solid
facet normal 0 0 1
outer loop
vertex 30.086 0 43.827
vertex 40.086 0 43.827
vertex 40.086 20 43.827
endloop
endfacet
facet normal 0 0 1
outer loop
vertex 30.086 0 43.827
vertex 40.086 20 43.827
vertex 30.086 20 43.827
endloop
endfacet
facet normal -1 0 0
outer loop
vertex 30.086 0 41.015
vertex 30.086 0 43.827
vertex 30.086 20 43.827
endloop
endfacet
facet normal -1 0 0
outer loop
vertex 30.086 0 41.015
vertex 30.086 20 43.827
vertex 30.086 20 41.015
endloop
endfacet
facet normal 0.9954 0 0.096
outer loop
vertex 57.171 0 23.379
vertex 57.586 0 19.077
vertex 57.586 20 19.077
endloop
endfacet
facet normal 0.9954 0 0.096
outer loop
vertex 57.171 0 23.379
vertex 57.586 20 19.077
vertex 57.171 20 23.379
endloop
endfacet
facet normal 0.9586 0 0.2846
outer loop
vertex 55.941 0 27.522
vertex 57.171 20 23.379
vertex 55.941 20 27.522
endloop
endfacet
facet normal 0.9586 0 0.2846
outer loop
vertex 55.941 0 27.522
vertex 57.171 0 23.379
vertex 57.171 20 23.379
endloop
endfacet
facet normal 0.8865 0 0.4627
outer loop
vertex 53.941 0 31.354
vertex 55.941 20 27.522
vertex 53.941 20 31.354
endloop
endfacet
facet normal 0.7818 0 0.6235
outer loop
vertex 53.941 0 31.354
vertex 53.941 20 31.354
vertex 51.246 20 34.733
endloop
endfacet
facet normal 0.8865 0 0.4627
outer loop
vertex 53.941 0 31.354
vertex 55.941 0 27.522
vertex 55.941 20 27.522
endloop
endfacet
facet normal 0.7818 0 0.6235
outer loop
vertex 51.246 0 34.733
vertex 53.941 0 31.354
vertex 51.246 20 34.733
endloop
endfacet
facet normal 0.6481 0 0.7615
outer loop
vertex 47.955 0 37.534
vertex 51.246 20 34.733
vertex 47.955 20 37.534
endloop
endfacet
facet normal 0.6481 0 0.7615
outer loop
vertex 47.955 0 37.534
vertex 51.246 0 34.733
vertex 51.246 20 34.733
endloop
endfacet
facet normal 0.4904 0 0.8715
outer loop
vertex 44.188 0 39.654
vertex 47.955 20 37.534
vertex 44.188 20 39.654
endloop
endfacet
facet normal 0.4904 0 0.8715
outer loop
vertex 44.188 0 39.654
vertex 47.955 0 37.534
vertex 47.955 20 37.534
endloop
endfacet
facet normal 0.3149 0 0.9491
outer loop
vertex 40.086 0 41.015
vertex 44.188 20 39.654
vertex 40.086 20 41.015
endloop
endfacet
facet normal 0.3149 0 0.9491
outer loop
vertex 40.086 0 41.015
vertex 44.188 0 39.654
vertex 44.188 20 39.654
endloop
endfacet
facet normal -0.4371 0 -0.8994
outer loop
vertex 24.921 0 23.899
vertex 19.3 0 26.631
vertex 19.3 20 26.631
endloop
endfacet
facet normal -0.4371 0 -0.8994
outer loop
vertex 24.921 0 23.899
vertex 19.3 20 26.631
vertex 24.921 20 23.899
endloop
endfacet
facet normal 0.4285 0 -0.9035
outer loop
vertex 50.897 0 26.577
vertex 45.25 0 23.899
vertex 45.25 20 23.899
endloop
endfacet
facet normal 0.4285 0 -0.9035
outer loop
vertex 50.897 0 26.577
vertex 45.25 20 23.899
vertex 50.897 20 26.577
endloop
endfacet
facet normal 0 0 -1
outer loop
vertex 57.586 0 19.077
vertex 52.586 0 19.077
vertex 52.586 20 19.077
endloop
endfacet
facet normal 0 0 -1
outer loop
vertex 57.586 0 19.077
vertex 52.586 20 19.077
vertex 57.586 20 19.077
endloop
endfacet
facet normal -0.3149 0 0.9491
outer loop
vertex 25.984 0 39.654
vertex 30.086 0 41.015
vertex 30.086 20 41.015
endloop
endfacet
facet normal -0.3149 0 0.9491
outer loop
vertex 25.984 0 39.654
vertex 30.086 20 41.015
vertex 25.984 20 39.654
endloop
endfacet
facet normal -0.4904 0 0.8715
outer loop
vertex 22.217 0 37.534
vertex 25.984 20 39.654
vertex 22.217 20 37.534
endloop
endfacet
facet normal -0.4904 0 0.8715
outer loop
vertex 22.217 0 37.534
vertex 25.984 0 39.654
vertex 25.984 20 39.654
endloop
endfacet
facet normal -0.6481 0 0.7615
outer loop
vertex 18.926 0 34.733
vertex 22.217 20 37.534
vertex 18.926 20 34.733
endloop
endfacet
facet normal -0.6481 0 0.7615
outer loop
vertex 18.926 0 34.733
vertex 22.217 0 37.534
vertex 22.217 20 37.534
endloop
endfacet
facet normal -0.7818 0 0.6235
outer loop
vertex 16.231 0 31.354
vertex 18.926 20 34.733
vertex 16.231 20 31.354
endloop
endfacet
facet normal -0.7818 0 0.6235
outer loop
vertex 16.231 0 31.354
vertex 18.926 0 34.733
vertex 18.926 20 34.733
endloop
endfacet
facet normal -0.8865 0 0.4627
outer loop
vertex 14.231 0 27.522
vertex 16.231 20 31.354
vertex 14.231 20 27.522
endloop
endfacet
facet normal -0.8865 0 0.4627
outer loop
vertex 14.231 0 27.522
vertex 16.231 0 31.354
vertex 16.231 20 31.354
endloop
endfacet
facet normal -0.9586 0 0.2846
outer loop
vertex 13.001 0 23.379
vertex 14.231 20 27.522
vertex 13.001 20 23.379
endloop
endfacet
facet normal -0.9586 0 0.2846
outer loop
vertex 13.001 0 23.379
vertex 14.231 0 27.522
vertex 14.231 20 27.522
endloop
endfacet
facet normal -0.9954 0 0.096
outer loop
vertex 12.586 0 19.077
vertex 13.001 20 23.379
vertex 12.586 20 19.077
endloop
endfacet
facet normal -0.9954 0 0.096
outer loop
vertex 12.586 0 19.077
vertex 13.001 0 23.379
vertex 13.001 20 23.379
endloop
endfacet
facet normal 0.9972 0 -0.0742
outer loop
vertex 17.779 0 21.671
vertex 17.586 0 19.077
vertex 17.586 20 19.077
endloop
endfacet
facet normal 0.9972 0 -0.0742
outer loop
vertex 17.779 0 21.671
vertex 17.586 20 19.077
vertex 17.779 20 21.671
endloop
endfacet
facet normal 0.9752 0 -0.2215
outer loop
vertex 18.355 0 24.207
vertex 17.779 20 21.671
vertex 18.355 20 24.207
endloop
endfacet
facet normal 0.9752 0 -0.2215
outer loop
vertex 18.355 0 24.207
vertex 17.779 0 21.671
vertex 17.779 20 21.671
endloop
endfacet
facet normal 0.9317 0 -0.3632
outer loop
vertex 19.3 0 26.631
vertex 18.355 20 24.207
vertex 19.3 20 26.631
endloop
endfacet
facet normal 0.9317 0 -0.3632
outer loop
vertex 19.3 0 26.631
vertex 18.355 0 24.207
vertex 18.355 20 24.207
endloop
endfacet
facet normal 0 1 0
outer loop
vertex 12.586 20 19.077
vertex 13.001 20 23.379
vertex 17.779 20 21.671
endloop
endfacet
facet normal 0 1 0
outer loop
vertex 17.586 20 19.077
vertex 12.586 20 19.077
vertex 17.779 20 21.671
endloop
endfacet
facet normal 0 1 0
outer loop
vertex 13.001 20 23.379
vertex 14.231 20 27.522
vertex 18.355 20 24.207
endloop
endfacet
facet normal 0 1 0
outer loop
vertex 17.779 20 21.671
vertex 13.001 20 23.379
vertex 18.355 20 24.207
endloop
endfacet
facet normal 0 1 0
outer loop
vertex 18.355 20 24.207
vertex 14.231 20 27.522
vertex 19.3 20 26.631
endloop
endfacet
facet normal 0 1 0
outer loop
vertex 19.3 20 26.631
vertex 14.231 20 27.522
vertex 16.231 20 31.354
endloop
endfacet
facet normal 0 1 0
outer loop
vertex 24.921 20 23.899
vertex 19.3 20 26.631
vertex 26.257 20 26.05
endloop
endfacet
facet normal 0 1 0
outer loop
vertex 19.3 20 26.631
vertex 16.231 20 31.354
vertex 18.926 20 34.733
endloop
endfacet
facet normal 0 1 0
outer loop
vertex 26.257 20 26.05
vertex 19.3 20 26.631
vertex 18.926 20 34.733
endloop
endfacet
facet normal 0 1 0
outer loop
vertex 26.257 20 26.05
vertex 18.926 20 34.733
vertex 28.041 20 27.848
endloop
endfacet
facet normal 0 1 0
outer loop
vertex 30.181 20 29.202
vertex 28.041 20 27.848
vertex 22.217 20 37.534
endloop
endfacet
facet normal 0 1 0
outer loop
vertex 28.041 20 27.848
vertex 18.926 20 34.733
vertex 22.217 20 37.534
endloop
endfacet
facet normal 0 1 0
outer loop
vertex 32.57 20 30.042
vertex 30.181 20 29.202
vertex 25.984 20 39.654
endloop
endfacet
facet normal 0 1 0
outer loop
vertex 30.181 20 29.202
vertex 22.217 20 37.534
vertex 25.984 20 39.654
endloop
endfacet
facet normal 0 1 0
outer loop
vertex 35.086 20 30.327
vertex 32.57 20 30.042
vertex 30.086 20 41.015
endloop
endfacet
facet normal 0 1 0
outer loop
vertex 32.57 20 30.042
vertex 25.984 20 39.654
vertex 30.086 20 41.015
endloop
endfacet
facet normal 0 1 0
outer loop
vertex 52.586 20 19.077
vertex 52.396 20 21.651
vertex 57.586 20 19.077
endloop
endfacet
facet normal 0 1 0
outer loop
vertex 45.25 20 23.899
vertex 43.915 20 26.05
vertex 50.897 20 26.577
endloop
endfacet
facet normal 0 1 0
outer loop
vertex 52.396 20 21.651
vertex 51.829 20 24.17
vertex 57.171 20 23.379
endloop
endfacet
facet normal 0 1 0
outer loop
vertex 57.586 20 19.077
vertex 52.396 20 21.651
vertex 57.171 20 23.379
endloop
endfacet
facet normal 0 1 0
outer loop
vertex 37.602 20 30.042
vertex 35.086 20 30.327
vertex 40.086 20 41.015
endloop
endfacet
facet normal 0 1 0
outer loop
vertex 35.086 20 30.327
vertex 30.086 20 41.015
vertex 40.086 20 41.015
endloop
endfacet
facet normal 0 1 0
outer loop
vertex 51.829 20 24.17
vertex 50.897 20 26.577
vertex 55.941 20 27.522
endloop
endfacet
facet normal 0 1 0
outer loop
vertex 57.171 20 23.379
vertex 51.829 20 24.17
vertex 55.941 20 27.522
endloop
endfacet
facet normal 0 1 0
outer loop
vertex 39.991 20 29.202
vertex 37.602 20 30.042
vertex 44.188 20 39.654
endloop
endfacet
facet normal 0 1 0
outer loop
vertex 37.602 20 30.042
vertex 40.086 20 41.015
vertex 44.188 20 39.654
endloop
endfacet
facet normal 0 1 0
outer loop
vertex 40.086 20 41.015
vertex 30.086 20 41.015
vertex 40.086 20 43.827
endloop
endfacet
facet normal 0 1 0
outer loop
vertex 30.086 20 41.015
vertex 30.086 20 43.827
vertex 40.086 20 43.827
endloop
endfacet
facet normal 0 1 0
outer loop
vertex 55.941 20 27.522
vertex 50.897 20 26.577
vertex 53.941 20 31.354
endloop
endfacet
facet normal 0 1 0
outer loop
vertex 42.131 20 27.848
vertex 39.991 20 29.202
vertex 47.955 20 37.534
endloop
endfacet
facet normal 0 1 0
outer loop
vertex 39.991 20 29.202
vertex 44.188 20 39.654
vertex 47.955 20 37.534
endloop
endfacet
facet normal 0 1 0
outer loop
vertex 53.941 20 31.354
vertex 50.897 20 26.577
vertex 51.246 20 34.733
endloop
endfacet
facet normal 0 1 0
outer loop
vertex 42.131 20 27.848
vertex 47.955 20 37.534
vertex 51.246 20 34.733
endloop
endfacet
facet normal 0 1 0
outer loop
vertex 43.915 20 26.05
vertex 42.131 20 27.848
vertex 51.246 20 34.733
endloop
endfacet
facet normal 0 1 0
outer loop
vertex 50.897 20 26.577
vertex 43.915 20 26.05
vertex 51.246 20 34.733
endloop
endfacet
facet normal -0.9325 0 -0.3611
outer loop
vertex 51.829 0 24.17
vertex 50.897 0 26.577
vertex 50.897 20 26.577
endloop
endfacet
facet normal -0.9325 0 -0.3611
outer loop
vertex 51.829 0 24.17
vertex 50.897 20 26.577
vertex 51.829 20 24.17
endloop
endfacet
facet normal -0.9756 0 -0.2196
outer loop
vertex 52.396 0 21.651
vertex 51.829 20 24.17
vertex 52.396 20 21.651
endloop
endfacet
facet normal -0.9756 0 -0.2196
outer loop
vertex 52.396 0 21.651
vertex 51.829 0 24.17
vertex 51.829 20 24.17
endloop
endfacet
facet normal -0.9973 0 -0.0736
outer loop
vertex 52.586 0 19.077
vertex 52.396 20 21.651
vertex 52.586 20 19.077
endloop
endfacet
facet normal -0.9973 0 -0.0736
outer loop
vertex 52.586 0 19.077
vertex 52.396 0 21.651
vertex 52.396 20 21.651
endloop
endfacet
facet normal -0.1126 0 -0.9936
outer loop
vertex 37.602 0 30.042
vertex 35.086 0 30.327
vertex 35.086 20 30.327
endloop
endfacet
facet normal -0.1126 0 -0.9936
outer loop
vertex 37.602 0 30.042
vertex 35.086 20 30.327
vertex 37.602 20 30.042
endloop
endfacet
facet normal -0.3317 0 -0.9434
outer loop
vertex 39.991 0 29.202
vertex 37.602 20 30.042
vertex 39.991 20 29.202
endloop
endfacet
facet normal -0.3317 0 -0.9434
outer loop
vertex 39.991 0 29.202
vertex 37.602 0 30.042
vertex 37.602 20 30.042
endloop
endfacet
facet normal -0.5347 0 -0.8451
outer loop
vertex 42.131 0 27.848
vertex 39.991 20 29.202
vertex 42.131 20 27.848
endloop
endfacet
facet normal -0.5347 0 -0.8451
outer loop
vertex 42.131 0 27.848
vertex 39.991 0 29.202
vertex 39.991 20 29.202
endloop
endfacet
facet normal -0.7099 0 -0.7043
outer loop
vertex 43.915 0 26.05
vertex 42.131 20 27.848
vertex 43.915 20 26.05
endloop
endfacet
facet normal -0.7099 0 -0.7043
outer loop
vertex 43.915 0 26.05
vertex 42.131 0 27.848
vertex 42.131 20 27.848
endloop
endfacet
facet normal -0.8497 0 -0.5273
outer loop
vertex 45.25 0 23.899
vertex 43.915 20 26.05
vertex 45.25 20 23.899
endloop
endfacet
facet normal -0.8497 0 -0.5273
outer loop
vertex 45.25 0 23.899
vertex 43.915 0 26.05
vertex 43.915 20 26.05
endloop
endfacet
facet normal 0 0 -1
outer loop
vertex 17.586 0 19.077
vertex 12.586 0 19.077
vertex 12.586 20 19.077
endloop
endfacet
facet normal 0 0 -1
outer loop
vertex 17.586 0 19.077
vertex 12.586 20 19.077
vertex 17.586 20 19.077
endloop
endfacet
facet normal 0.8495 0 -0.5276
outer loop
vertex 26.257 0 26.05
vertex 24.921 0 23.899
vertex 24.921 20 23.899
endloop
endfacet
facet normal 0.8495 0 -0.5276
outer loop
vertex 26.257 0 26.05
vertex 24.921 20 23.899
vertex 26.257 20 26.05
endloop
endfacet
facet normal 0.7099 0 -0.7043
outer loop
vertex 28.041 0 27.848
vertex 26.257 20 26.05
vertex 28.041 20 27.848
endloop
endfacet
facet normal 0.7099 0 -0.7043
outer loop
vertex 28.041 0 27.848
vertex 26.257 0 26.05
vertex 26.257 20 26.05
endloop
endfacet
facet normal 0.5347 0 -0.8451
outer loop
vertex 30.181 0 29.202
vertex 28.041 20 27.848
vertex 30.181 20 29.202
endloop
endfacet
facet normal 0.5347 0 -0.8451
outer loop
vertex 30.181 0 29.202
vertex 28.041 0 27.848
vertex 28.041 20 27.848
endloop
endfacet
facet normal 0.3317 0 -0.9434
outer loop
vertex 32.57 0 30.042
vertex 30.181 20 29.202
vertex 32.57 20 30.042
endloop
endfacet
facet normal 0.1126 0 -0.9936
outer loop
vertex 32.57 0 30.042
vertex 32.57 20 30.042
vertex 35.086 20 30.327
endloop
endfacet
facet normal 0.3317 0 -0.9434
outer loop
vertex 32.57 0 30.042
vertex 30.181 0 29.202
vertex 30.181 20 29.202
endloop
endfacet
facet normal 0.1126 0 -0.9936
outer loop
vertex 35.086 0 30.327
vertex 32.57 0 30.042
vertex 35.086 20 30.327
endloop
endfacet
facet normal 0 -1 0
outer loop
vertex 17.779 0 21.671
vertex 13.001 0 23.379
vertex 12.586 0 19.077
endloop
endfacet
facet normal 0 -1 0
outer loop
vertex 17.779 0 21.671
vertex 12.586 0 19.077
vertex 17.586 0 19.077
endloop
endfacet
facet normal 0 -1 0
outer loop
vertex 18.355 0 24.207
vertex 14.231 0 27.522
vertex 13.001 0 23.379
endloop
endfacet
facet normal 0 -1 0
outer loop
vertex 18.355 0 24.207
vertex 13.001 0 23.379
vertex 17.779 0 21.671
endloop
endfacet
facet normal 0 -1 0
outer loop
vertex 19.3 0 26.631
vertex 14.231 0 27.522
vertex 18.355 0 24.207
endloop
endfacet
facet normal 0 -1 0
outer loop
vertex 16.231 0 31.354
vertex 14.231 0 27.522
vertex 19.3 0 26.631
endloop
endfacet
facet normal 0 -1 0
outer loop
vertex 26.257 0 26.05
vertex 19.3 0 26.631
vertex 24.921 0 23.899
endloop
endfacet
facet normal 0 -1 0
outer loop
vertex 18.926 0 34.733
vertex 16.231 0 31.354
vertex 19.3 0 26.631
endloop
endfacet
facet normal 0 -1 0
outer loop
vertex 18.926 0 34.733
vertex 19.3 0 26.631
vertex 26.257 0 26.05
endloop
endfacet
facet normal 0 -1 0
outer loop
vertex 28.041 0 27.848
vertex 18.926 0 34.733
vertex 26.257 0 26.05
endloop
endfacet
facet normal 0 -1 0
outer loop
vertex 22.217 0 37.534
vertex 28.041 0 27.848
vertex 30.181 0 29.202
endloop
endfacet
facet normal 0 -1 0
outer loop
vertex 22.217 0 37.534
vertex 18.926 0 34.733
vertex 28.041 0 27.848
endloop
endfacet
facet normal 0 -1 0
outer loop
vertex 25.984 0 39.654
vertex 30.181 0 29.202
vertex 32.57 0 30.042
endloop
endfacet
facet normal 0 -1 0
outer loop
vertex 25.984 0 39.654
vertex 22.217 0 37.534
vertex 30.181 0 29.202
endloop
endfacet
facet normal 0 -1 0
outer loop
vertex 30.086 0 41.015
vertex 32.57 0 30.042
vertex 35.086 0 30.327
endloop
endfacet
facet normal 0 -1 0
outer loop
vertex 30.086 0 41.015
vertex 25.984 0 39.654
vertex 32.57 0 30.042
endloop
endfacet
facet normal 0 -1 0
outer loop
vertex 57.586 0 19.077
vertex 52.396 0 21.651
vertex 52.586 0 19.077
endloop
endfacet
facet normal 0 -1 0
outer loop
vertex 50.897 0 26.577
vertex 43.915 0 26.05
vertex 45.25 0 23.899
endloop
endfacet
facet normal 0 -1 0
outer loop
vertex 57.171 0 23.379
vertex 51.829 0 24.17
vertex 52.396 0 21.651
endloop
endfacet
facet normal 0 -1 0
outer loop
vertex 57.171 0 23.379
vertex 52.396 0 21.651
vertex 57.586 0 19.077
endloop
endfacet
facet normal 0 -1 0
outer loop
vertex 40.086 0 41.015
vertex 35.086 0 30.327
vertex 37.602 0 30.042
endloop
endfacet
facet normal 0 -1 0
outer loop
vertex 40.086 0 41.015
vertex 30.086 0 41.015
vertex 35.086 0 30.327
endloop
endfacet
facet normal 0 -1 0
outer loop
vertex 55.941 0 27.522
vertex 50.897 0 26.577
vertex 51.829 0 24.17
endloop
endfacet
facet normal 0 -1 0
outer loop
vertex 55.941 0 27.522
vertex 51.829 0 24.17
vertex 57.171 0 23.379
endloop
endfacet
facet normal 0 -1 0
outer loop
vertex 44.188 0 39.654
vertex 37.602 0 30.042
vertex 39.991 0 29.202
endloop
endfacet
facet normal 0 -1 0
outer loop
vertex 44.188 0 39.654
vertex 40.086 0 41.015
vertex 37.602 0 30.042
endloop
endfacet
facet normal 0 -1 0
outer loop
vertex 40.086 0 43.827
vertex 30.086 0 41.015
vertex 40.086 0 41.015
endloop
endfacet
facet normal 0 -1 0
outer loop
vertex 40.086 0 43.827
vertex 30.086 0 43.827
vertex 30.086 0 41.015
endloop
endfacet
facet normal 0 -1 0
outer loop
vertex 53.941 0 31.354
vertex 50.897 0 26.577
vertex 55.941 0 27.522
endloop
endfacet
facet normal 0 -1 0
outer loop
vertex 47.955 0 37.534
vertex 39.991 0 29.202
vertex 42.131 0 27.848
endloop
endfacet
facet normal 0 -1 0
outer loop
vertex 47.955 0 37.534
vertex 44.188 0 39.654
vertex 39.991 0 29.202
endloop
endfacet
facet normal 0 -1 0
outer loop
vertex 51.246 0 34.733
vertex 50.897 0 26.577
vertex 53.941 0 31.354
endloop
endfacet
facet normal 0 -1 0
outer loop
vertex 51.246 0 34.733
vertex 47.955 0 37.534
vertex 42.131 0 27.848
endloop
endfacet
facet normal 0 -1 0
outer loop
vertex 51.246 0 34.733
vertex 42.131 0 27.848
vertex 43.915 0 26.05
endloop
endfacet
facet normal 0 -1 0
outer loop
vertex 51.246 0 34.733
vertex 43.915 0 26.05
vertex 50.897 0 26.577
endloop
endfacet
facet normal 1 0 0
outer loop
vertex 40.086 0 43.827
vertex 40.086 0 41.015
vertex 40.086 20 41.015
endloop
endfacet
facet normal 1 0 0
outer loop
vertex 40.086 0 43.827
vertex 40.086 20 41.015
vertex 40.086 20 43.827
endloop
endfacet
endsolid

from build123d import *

# Parameters (mm, degrees)
F1_DEPTH = 20


with BuildPart() as f1:
    # F0 (on Front) → F1 (new body)
    with BuildSketch(Plane.XZ):
        with BuildLine():
            ThreePointArc((17.5859551343, 19.07713693), (18.019843983, 22.9498427249), (19.2999951541, 26.6305115074))
            ThreePointArc((19.2999951541, 26.6305115074), (20.3740299114, 28.5539114993), (21.6811985158, 30.32713693))
            ThreePointArc((21.6811985158, 30.32713693), (25.4785218795, 33.7040718876), (30.0859551343, 35.8476467612))
            Line((30.0859551343, 35.8476467612), (30.0859551343, 41.0145478985))
            ThreePointArc((30.0859551343, 41.0145478985), (17.4968960349, 33.1083521304), (12.5859551343, 19.07713693))
            Line((12.5859551343, 19.07713693), (17.5859551343, 19.07713693))
        make_face()
        with BuildLine():
            Line((30.0859551343, 43.82713693), (30.0859551343, 41.0145478985))
            ThreePointArc((30.0859551343, 41.0145478985), (35.0859551343, 41.57713693), (40.0859551343, 41.0145478985))
            Line((40.0859551343, 41.0145478985), (40.0859551343, 43.82713693))
            Line((40.0859551343, 43.82713693), (30.0859551343, 43.82713693))
        make_face()
        with BuildLine():
            Line((30.0859551343, 41.0145478985), (30.0859551343, 35.8476467612))
            ThreePointArc((30.0859551343, 35.8476467612), (35.0859551343, 36.57713693), (40.0859551343, 35.8476467612))
            Line((40.0859551343, 35.8476467612), (40.0859551343, 41.0145478985))
            ThreePointArc((40.0859551343, 41.0145478985), (35.0859551343, 41.57713693), (30.0859551343, 41.0145478985))
        make_face()
        with BuildLine():
            ThreePointArc((48.4907117527, 30.32713693), (49.8138676132, 28.5290464732), (50.8973434351, 26.57713693))
            ThreePointArc((50.8973434351, 26.57713693), (52.1585837436, 22.921008984), (52.5859551343, 19.07713693))
            Line((52.5859551343, 19.07713693), (57.5859551343, 19.07713693))
            ThreePointArc((57.5859551343, 19.07713693), (52.6750142336, 33.1083521304), (40.0859551343, 41.0145478985))
            Line((40.0859551343, 41.0145478985), (40.0859551343, 35.8476467612))
            ThreePointArc((40.0859551343, 35.8476467612), (44.693388389, 33.7040718876), (48.4907117527, 30.32713693))
        make_face()
        with BuildLine():
            Line((19.2999951541, 26.6305115074), (24.9214912266, 23.8985655014))
            ThreePointArc((24.9214912266, 23.8985655014), (29.0725771912, 28.5851222957), (35.0859551343, 30.32713693))
            Line((35.0859551343, 30.32713693), (30.0859551343, 30.32713693))
            Line((30.0859551343, 30.32713693), (30.0859551343, 35.8476467612))
            ThreePointArc((30.0859551343, 35.8476467612), (25.4785218795, 33.7040718876), (21.6811985158, 30.32713693))
            ThreePointArc((21.6811985158, 30.32713693), (20.3740299114, 28.5539114993), (19.2999951541, 26.6305115074))
        make_face()
        with BuildLine():
            Line((30.0859551343, 30.32713693), (35.0859551343, 30.32713693))
            Line((35.0859551343, 30.32713693), (40.0859551343, 30.32713693))
            Line((40.0859551343, 30.32713693), (40.0859551343, 35.8476467612))
            ThreePointArc((40.0859551343, 35.8476467612), (35.0859551343, 36.57713693), (30.0859551343, 35.8476467612))
            Line((30.0859551343, 35.8476467612), (30.0859551343, 30.32713693))
        make_face()
        with BuildLine():
            Line((40.0859551343, 30.32713693), (35.0859551343, 30.32713693))
            ThreePointArc((35.0859551343, 30.32713693), (41.0993330773, 28.5851222957), (45.2504190419, 23.8985655014))
            Line((45.2504190419, 23.8985655014), (50.8973434351, 26.57713693))
            ThreePointArc((50.8973434351, 26.57713693), (49.8138676132, 28.5290464732), (48.4907117527, 30.32713693))
            ThreePointArc((48.4907117527, 30.32713693), (44.693388389, 33.7040718876), (40.0859551343, 35.8476467612))
            Line((40.0859551343, 35.8476467612), (40.0859551343, 30.32713693))
        make_face()
    extrude(amount=-F1_DEPTH)


solid = f1.part
